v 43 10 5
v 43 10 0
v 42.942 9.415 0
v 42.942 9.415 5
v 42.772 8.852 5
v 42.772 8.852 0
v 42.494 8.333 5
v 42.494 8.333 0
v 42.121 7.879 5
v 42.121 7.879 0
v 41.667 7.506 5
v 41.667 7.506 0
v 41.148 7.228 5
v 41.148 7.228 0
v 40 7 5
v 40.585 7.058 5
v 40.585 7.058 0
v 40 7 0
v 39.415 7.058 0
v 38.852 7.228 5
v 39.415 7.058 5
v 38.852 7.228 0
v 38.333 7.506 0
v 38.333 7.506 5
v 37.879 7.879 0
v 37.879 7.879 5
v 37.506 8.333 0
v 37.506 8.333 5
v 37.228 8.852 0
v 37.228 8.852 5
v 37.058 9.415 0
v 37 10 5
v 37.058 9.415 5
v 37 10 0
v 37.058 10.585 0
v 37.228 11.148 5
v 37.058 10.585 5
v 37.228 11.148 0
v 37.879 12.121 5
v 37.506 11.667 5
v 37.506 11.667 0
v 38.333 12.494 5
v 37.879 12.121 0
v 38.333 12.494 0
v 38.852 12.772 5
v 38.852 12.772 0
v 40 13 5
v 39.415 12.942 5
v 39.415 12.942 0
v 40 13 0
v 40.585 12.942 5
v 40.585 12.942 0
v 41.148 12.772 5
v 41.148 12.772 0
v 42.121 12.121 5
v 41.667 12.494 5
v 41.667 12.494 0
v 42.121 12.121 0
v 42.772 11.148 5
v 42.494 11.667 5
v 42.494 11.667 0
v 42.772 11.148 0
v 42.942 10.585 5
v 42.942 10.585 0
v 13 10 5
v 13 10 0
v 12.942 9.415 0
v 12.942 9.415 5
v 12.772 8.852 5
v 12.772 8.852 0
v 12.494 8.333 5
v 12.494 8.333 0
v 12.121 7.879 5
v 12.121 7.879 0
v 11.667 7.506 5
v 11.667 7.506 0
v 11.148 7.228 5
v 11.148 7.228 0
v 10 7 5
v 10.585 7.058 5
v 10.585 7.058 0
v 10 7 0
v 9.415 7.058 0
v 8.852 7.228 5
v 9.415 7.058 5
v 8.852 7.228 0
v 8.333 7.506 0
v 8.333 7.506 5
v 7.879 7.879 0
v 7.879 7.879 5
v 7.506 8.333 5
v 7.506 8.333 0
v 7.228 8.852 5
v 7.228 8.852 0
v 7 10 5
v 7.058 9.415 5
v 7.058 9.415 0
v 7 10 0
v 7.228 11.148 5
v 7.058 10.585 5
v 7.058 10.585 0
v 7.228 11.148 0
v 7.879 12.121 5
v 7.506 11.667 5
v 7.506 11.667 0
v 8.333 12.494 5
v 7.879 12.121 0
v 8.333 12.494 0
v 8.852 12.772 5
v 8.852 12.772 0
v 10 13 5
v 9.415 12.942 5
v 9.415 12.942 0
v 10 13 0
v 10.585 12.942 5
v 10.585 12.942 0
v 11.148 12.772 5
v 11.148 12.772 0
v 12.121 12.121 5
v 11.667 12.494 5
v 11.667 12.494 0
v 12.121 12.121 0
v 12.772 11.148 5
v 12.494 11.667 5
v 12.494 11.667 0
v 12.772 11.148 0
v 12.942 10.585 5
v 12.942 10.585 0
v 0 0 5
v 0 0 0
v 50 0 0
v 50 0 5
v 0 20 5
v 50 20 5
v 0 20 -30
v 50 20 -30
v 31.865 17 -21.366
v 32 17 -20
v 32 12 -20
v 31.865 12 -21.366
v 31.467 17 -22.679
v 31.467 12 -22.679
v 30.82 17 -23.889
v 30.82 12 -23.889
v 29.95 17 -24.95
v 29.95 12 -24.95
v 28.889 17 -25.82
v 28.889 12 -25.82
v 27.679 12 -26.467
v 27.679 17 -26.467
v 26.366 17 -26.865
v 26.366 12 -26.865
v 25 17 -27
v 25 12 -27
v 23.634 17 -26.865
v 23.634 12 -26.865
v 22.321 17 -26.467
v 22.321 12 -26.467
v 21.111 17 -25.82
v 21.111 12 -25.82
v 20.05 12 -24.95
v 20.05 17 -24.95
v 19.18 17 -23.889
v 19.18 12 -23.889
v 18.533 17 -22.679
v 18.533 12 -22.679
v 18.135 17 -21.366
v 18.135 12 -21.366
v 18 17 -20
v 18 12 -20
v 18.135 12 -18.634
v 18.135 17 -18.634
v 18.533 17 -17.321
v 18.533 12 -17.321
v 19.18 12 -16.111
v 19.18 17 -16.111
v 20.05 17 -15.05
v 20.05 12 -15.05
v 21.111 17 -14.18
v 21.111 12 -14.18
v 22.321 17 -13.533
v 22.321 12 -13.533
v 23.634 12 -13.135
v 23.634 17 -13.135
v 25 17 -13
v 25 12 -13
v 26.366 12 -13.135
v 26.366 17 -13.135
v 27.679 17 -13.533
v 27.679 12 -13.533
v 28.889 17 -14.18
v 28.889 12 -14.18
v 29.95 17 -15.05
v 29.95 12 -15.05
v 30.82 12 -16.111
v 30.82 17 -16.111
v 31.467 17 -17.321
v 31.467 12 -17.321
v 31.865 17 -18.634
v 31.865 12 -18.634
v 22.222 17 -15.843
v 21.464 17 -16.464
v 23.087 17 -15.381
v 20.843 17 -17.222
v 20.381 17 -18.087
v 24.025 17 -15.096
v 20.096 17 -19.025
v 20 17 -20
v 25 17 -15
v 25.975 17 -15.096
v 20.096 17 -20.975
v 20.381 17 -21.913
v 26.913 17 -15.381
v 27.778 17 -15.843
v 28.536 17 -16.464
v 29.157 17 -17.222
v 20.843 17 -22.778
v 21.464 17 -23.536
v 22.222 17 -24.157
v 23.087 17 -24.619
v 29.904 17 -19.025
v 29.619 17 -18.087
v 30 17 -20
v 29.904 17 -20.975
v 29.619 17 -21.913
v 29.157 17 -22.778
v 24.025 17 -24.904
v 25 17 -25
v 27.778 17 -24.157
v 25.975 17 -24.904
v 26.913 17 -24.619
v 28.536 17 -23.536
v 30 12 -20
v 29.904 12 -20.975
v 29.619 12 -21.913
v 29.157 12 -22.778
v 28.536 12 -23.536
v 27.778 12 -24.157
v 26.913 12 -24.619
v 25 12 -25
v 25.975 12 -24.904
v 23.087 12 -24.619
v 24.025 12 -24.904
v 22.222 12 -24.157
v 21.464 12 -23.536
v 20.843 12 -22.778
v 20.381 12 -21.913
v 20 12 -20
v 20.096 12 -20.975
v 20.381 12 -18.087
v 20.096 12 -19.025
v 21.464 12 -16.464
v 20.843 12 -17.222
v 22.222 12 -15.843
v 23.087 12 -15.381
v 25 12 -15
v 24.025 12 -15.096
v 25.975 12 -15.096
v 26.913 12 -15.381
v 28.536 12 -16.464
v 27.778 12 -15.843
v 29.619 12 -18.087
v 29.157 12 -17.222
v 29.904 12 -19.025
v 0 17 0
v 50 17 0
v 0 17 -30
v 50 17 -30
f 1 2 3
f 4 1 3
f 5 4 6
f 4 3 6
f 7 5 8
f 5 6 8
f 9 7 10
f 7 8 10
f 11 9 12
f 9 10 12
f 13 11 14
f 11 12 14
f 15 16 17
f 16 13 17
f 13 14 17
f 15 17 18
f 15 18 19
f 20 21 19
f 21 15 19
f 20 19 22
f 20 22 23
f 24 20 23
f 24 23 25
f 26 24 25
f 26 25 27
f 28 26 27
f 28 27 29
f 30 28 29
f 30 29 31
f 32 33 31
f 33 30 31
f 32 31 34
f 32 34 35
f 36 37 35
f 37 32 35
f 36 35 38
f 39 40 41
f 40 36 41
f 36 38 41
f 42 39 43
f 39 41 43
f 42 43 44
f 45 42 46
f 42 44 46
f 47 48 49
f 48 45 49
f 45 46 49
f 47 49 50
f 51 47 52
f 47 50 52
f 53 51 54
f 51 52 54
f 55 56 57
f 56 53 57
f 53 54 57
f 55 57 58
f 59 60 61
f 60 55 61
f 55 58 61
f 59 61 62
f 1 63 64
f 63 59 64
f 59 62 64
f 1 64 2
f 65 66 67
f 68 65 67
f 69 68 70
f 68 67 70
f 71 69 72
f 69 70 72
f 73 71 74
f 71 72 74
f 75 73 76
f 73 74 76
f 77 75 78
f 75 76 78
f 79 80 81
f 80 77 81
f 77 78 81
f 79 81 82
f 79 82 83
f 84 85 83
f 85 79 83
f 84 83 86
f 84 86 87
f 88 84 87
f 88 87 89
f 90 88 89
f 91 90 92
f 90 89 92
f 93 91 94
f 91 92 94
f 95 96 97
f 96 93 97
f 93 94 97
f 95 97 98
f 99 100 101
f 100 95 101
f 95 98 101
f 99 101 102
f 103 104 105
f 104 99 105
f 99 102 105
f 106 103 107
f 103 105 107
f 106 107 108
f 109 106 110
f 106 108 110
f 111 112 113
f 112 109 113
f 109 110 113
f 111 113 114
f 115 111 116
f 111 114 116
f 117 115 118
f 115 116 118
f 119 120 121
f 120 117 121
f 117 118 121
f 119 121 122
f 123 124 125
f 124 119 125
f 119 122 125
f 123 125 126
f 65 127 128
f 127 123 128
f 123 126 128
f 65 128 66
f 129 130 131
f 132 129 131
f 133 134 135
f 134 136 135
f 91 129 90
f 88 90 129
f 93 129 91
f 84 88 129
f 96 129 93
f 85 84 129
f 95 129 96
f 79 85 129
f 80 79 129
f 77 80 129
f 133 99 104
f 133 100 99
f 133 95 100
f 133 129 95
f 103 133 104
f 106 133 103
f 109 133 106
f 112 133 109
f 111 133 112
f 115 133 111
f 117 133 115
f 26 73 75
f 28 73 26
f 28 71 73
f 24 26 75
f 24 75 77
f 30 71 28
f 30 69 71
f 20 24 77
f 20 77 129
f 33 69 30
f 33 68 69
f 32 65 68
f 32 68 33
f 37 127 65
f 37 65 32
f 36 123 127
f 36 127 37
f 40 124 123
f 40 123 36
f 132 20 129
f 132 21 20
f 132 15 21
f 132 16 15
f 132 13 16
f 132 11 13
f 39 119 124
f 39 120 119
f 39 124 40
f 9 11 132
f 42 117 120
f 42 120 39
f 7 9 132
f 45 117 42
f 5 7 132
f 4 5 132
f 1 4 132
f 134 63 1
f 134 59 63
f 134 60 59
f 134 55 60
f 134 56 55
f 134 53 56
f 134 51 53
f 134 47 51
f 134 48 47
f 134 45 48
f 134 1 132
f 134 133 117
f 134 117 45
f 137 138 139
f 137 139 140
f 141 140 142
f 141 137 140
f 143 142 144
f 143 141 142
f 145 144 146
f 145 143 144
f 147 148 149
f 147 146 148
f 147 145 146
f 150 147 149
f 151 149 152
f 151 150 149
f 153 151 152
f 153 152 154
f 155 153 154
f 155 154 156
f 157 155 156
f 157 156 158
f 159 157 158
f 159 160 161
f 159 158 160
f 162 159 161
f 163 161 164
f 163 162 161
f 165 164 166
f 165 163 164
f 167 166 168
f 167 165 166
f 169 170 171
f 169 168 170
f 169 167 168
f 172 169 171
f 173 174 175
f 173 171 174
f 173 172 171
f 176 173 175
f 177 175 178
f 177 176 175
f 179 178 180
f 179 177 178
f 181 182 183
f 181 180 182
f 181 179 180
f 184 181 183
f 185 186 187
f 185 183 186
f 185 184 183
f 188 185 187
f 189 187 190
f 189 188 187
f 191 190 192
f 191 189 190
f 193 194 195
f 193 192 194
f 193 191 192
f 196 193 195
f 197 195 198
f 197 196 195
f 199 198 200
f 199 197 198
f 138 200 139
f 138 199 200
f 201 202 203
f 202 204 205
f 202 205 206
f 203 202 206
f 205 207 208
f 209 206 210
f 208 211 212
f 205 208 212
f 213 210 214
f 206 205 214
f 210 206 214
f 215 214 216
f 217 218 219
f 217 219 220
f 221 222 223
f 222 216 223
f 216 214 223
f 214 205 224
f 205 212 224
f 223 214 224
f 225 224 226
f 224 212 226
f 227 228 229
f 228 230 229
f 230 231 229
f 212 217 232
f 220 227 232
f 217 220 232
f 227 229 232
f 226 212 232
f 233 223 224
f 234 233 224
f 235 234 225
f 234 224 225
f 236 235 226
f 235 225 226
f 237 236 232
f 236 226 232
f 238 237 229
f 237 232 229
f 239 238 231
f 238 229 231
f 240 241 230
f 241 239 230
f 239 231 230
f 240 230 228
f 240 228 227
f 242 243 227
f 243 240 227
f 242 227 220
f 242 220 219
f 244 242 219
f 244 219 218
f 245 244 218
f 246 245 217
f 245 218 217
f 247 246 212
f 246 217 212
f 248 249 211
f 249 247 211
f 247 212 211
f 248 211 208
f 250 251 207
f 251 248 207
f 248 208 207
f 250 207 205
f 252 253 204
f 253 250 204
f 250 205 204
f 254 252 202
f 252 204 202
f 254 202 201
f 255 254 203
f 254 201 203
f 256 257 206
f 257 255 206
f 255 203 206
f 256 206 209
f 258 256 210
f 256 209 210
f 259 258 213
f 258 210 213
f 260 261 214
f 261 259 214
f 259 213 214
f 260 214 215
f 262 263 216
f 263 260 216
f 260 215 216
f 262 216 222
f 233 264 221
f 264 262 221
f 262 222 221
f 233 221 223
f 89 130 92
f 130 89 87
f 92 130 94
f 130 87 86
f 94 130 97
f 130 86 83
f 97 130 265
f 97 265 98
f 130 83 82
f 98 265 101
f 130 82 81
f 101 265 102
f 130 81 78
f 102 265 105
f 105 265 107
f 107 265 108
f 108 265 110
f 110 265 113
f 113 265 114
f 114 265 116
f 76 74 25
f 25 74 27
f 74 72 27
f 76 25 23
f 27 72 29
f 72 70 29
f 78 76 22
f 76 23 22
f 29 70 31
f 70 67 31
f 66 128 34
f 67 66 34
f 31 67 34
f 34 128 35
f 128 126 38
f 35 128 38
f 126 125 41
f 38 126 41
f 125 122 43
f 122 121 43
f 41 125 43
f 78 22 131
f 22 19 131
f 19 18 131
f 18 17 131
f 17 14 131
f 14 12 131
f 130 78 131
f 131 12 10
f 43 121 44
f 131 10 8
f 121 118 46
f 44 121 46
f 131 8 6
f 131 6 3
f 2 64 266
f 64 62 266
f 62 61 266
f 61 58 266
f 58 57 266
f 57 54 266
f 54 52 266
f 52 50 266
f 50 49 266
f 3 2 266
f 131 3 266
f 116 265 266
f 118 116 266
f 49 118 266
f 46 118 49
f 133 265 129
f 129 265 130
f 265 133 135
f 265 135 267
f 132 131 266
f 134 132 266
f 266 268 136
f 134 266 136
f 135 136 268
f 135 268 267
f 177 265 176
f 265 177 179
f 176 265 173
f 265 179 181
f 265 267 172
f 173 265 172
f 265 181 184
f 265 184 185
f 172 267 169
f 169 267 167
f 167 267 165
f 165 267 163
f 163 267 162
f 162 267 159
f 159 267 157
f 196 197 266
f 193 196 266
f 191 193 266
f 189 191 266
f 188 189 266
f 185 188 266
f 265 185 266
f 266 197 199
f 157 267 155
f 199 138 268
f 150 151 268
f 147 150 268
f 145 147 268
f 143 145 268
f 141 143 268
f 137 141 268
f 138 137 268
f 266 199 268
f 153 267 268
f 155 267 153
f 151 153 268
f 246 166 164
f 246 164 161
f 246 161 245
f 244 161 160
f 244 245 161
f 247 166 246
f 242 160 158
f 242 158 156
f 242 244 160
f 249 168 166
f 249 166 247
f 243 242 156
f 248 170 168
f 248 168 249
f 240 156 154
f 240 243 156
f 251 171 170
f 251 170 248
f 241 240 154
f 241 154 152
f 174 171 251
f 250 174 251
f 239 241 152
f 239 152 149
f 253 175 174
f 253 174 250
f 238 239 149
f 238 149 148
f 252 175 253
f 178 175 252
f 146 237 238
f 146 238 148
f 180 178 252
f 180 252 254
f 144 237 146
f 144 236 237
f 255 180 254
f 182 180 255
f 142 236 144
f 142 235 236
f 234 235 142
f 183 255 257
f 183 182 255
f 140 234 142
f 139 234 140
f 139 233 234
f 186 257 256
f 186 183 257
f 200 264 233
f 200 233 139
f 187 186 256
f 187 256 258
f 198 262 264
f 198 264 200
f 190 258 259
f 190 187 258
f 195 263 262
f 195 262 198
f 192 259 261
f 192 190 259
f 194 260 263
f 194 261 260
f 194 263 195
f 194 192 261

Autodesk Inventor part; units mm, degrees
ref_plane "YZ Plane" through (0, 0, 0) normal (1, 0, 0) x (0, 1, 0)
ref_plane "XZ Plane" through (0, 0, 0) normal (0, 1, 0) x (-1, 0, 0)
ref_plane "XY Plane" through (0, 0, 0) normal (0, 0, 1) x (1, 0, 0)
sketch "Sketch5" plane through (0, 0, 0) normal (0, 0, 1) x (1, 0, 0)
  line L0 (0, 0) -> (50, 0)
  line L1 (50, 0) -> (50, 20)
  line L2 (50, 20) -> (0, 20)
  line L3 (0, 20) -> (0, 0)
  circle A0 centre (10, 10) radius 3
  circle A1 centre (40, 10) radius 3
  dimension "d43" = 50
  dimension "d44" = 20
  dimension "d47" = 6
  dimension "d48" = 6
  dimension "d49" = 10
  dimension "d50" = 10
  dimension "d51" = 10
  dimension "d52" = 10
extrude "Extrusion5" add sketch "Sketch5" along normal blind 5
sketch "Sketch8" plane through (0, 20, 0) normal (0, 1, 0) x (1, 0, 0)
  line L0 (50, 0) -> (0, 0) projected
  line L1 (0, 0) -> (0, -5) projected
  line L2 (50, -5) -> (0, -5) projected
  line L3 (50, 0) -> (50, -5) projected
  line L4 (0, -5) -> (50, -5)
  line L5 (50, -5) -> (50, 30)
  line L6 (50, 30) -> (0, 30)
  line L7 (0, 30) -> (0, -5)
  line L8 (0, 30) -> (0, 15) construction
  line L9 (0, 0) -> (0, 25) construction
  dimension "d55" = 50
  dimension "d56" = 35
extrude "Extrusion6" add sketch "Sketch8" against normal blind 3 contours L0 L7 L6 L5
sketch "Sketch10" plane through (0, 17, 0) normal (0, -1, 0) x (1, 0, 0)
  line L0 (0, 0) -> (50, 0) projected
  line L1 (50, -30) -> (50, 0) projected
  line L2 (25, 0) -> (25, -50.2425) construction
  line L3 (25, 0) -> (25, -20) construction
  line L4 (25, -20) -> (44.8883, -20) construction
  line L5 (44.8883, -20) -> (4.4649, -20) construction
  circle A0 centre (25, -20) radius 5
  circle A1 centre (25, -20) radius 7
  dimension "d68" = 20
  dimension "d69" = 10
  dimension "d70" = 14
extrude "Extrusion8" add sketch "Sketch10" along normal blind 5
properties part number "z smooth rod mount" material "ABS Plastic"
